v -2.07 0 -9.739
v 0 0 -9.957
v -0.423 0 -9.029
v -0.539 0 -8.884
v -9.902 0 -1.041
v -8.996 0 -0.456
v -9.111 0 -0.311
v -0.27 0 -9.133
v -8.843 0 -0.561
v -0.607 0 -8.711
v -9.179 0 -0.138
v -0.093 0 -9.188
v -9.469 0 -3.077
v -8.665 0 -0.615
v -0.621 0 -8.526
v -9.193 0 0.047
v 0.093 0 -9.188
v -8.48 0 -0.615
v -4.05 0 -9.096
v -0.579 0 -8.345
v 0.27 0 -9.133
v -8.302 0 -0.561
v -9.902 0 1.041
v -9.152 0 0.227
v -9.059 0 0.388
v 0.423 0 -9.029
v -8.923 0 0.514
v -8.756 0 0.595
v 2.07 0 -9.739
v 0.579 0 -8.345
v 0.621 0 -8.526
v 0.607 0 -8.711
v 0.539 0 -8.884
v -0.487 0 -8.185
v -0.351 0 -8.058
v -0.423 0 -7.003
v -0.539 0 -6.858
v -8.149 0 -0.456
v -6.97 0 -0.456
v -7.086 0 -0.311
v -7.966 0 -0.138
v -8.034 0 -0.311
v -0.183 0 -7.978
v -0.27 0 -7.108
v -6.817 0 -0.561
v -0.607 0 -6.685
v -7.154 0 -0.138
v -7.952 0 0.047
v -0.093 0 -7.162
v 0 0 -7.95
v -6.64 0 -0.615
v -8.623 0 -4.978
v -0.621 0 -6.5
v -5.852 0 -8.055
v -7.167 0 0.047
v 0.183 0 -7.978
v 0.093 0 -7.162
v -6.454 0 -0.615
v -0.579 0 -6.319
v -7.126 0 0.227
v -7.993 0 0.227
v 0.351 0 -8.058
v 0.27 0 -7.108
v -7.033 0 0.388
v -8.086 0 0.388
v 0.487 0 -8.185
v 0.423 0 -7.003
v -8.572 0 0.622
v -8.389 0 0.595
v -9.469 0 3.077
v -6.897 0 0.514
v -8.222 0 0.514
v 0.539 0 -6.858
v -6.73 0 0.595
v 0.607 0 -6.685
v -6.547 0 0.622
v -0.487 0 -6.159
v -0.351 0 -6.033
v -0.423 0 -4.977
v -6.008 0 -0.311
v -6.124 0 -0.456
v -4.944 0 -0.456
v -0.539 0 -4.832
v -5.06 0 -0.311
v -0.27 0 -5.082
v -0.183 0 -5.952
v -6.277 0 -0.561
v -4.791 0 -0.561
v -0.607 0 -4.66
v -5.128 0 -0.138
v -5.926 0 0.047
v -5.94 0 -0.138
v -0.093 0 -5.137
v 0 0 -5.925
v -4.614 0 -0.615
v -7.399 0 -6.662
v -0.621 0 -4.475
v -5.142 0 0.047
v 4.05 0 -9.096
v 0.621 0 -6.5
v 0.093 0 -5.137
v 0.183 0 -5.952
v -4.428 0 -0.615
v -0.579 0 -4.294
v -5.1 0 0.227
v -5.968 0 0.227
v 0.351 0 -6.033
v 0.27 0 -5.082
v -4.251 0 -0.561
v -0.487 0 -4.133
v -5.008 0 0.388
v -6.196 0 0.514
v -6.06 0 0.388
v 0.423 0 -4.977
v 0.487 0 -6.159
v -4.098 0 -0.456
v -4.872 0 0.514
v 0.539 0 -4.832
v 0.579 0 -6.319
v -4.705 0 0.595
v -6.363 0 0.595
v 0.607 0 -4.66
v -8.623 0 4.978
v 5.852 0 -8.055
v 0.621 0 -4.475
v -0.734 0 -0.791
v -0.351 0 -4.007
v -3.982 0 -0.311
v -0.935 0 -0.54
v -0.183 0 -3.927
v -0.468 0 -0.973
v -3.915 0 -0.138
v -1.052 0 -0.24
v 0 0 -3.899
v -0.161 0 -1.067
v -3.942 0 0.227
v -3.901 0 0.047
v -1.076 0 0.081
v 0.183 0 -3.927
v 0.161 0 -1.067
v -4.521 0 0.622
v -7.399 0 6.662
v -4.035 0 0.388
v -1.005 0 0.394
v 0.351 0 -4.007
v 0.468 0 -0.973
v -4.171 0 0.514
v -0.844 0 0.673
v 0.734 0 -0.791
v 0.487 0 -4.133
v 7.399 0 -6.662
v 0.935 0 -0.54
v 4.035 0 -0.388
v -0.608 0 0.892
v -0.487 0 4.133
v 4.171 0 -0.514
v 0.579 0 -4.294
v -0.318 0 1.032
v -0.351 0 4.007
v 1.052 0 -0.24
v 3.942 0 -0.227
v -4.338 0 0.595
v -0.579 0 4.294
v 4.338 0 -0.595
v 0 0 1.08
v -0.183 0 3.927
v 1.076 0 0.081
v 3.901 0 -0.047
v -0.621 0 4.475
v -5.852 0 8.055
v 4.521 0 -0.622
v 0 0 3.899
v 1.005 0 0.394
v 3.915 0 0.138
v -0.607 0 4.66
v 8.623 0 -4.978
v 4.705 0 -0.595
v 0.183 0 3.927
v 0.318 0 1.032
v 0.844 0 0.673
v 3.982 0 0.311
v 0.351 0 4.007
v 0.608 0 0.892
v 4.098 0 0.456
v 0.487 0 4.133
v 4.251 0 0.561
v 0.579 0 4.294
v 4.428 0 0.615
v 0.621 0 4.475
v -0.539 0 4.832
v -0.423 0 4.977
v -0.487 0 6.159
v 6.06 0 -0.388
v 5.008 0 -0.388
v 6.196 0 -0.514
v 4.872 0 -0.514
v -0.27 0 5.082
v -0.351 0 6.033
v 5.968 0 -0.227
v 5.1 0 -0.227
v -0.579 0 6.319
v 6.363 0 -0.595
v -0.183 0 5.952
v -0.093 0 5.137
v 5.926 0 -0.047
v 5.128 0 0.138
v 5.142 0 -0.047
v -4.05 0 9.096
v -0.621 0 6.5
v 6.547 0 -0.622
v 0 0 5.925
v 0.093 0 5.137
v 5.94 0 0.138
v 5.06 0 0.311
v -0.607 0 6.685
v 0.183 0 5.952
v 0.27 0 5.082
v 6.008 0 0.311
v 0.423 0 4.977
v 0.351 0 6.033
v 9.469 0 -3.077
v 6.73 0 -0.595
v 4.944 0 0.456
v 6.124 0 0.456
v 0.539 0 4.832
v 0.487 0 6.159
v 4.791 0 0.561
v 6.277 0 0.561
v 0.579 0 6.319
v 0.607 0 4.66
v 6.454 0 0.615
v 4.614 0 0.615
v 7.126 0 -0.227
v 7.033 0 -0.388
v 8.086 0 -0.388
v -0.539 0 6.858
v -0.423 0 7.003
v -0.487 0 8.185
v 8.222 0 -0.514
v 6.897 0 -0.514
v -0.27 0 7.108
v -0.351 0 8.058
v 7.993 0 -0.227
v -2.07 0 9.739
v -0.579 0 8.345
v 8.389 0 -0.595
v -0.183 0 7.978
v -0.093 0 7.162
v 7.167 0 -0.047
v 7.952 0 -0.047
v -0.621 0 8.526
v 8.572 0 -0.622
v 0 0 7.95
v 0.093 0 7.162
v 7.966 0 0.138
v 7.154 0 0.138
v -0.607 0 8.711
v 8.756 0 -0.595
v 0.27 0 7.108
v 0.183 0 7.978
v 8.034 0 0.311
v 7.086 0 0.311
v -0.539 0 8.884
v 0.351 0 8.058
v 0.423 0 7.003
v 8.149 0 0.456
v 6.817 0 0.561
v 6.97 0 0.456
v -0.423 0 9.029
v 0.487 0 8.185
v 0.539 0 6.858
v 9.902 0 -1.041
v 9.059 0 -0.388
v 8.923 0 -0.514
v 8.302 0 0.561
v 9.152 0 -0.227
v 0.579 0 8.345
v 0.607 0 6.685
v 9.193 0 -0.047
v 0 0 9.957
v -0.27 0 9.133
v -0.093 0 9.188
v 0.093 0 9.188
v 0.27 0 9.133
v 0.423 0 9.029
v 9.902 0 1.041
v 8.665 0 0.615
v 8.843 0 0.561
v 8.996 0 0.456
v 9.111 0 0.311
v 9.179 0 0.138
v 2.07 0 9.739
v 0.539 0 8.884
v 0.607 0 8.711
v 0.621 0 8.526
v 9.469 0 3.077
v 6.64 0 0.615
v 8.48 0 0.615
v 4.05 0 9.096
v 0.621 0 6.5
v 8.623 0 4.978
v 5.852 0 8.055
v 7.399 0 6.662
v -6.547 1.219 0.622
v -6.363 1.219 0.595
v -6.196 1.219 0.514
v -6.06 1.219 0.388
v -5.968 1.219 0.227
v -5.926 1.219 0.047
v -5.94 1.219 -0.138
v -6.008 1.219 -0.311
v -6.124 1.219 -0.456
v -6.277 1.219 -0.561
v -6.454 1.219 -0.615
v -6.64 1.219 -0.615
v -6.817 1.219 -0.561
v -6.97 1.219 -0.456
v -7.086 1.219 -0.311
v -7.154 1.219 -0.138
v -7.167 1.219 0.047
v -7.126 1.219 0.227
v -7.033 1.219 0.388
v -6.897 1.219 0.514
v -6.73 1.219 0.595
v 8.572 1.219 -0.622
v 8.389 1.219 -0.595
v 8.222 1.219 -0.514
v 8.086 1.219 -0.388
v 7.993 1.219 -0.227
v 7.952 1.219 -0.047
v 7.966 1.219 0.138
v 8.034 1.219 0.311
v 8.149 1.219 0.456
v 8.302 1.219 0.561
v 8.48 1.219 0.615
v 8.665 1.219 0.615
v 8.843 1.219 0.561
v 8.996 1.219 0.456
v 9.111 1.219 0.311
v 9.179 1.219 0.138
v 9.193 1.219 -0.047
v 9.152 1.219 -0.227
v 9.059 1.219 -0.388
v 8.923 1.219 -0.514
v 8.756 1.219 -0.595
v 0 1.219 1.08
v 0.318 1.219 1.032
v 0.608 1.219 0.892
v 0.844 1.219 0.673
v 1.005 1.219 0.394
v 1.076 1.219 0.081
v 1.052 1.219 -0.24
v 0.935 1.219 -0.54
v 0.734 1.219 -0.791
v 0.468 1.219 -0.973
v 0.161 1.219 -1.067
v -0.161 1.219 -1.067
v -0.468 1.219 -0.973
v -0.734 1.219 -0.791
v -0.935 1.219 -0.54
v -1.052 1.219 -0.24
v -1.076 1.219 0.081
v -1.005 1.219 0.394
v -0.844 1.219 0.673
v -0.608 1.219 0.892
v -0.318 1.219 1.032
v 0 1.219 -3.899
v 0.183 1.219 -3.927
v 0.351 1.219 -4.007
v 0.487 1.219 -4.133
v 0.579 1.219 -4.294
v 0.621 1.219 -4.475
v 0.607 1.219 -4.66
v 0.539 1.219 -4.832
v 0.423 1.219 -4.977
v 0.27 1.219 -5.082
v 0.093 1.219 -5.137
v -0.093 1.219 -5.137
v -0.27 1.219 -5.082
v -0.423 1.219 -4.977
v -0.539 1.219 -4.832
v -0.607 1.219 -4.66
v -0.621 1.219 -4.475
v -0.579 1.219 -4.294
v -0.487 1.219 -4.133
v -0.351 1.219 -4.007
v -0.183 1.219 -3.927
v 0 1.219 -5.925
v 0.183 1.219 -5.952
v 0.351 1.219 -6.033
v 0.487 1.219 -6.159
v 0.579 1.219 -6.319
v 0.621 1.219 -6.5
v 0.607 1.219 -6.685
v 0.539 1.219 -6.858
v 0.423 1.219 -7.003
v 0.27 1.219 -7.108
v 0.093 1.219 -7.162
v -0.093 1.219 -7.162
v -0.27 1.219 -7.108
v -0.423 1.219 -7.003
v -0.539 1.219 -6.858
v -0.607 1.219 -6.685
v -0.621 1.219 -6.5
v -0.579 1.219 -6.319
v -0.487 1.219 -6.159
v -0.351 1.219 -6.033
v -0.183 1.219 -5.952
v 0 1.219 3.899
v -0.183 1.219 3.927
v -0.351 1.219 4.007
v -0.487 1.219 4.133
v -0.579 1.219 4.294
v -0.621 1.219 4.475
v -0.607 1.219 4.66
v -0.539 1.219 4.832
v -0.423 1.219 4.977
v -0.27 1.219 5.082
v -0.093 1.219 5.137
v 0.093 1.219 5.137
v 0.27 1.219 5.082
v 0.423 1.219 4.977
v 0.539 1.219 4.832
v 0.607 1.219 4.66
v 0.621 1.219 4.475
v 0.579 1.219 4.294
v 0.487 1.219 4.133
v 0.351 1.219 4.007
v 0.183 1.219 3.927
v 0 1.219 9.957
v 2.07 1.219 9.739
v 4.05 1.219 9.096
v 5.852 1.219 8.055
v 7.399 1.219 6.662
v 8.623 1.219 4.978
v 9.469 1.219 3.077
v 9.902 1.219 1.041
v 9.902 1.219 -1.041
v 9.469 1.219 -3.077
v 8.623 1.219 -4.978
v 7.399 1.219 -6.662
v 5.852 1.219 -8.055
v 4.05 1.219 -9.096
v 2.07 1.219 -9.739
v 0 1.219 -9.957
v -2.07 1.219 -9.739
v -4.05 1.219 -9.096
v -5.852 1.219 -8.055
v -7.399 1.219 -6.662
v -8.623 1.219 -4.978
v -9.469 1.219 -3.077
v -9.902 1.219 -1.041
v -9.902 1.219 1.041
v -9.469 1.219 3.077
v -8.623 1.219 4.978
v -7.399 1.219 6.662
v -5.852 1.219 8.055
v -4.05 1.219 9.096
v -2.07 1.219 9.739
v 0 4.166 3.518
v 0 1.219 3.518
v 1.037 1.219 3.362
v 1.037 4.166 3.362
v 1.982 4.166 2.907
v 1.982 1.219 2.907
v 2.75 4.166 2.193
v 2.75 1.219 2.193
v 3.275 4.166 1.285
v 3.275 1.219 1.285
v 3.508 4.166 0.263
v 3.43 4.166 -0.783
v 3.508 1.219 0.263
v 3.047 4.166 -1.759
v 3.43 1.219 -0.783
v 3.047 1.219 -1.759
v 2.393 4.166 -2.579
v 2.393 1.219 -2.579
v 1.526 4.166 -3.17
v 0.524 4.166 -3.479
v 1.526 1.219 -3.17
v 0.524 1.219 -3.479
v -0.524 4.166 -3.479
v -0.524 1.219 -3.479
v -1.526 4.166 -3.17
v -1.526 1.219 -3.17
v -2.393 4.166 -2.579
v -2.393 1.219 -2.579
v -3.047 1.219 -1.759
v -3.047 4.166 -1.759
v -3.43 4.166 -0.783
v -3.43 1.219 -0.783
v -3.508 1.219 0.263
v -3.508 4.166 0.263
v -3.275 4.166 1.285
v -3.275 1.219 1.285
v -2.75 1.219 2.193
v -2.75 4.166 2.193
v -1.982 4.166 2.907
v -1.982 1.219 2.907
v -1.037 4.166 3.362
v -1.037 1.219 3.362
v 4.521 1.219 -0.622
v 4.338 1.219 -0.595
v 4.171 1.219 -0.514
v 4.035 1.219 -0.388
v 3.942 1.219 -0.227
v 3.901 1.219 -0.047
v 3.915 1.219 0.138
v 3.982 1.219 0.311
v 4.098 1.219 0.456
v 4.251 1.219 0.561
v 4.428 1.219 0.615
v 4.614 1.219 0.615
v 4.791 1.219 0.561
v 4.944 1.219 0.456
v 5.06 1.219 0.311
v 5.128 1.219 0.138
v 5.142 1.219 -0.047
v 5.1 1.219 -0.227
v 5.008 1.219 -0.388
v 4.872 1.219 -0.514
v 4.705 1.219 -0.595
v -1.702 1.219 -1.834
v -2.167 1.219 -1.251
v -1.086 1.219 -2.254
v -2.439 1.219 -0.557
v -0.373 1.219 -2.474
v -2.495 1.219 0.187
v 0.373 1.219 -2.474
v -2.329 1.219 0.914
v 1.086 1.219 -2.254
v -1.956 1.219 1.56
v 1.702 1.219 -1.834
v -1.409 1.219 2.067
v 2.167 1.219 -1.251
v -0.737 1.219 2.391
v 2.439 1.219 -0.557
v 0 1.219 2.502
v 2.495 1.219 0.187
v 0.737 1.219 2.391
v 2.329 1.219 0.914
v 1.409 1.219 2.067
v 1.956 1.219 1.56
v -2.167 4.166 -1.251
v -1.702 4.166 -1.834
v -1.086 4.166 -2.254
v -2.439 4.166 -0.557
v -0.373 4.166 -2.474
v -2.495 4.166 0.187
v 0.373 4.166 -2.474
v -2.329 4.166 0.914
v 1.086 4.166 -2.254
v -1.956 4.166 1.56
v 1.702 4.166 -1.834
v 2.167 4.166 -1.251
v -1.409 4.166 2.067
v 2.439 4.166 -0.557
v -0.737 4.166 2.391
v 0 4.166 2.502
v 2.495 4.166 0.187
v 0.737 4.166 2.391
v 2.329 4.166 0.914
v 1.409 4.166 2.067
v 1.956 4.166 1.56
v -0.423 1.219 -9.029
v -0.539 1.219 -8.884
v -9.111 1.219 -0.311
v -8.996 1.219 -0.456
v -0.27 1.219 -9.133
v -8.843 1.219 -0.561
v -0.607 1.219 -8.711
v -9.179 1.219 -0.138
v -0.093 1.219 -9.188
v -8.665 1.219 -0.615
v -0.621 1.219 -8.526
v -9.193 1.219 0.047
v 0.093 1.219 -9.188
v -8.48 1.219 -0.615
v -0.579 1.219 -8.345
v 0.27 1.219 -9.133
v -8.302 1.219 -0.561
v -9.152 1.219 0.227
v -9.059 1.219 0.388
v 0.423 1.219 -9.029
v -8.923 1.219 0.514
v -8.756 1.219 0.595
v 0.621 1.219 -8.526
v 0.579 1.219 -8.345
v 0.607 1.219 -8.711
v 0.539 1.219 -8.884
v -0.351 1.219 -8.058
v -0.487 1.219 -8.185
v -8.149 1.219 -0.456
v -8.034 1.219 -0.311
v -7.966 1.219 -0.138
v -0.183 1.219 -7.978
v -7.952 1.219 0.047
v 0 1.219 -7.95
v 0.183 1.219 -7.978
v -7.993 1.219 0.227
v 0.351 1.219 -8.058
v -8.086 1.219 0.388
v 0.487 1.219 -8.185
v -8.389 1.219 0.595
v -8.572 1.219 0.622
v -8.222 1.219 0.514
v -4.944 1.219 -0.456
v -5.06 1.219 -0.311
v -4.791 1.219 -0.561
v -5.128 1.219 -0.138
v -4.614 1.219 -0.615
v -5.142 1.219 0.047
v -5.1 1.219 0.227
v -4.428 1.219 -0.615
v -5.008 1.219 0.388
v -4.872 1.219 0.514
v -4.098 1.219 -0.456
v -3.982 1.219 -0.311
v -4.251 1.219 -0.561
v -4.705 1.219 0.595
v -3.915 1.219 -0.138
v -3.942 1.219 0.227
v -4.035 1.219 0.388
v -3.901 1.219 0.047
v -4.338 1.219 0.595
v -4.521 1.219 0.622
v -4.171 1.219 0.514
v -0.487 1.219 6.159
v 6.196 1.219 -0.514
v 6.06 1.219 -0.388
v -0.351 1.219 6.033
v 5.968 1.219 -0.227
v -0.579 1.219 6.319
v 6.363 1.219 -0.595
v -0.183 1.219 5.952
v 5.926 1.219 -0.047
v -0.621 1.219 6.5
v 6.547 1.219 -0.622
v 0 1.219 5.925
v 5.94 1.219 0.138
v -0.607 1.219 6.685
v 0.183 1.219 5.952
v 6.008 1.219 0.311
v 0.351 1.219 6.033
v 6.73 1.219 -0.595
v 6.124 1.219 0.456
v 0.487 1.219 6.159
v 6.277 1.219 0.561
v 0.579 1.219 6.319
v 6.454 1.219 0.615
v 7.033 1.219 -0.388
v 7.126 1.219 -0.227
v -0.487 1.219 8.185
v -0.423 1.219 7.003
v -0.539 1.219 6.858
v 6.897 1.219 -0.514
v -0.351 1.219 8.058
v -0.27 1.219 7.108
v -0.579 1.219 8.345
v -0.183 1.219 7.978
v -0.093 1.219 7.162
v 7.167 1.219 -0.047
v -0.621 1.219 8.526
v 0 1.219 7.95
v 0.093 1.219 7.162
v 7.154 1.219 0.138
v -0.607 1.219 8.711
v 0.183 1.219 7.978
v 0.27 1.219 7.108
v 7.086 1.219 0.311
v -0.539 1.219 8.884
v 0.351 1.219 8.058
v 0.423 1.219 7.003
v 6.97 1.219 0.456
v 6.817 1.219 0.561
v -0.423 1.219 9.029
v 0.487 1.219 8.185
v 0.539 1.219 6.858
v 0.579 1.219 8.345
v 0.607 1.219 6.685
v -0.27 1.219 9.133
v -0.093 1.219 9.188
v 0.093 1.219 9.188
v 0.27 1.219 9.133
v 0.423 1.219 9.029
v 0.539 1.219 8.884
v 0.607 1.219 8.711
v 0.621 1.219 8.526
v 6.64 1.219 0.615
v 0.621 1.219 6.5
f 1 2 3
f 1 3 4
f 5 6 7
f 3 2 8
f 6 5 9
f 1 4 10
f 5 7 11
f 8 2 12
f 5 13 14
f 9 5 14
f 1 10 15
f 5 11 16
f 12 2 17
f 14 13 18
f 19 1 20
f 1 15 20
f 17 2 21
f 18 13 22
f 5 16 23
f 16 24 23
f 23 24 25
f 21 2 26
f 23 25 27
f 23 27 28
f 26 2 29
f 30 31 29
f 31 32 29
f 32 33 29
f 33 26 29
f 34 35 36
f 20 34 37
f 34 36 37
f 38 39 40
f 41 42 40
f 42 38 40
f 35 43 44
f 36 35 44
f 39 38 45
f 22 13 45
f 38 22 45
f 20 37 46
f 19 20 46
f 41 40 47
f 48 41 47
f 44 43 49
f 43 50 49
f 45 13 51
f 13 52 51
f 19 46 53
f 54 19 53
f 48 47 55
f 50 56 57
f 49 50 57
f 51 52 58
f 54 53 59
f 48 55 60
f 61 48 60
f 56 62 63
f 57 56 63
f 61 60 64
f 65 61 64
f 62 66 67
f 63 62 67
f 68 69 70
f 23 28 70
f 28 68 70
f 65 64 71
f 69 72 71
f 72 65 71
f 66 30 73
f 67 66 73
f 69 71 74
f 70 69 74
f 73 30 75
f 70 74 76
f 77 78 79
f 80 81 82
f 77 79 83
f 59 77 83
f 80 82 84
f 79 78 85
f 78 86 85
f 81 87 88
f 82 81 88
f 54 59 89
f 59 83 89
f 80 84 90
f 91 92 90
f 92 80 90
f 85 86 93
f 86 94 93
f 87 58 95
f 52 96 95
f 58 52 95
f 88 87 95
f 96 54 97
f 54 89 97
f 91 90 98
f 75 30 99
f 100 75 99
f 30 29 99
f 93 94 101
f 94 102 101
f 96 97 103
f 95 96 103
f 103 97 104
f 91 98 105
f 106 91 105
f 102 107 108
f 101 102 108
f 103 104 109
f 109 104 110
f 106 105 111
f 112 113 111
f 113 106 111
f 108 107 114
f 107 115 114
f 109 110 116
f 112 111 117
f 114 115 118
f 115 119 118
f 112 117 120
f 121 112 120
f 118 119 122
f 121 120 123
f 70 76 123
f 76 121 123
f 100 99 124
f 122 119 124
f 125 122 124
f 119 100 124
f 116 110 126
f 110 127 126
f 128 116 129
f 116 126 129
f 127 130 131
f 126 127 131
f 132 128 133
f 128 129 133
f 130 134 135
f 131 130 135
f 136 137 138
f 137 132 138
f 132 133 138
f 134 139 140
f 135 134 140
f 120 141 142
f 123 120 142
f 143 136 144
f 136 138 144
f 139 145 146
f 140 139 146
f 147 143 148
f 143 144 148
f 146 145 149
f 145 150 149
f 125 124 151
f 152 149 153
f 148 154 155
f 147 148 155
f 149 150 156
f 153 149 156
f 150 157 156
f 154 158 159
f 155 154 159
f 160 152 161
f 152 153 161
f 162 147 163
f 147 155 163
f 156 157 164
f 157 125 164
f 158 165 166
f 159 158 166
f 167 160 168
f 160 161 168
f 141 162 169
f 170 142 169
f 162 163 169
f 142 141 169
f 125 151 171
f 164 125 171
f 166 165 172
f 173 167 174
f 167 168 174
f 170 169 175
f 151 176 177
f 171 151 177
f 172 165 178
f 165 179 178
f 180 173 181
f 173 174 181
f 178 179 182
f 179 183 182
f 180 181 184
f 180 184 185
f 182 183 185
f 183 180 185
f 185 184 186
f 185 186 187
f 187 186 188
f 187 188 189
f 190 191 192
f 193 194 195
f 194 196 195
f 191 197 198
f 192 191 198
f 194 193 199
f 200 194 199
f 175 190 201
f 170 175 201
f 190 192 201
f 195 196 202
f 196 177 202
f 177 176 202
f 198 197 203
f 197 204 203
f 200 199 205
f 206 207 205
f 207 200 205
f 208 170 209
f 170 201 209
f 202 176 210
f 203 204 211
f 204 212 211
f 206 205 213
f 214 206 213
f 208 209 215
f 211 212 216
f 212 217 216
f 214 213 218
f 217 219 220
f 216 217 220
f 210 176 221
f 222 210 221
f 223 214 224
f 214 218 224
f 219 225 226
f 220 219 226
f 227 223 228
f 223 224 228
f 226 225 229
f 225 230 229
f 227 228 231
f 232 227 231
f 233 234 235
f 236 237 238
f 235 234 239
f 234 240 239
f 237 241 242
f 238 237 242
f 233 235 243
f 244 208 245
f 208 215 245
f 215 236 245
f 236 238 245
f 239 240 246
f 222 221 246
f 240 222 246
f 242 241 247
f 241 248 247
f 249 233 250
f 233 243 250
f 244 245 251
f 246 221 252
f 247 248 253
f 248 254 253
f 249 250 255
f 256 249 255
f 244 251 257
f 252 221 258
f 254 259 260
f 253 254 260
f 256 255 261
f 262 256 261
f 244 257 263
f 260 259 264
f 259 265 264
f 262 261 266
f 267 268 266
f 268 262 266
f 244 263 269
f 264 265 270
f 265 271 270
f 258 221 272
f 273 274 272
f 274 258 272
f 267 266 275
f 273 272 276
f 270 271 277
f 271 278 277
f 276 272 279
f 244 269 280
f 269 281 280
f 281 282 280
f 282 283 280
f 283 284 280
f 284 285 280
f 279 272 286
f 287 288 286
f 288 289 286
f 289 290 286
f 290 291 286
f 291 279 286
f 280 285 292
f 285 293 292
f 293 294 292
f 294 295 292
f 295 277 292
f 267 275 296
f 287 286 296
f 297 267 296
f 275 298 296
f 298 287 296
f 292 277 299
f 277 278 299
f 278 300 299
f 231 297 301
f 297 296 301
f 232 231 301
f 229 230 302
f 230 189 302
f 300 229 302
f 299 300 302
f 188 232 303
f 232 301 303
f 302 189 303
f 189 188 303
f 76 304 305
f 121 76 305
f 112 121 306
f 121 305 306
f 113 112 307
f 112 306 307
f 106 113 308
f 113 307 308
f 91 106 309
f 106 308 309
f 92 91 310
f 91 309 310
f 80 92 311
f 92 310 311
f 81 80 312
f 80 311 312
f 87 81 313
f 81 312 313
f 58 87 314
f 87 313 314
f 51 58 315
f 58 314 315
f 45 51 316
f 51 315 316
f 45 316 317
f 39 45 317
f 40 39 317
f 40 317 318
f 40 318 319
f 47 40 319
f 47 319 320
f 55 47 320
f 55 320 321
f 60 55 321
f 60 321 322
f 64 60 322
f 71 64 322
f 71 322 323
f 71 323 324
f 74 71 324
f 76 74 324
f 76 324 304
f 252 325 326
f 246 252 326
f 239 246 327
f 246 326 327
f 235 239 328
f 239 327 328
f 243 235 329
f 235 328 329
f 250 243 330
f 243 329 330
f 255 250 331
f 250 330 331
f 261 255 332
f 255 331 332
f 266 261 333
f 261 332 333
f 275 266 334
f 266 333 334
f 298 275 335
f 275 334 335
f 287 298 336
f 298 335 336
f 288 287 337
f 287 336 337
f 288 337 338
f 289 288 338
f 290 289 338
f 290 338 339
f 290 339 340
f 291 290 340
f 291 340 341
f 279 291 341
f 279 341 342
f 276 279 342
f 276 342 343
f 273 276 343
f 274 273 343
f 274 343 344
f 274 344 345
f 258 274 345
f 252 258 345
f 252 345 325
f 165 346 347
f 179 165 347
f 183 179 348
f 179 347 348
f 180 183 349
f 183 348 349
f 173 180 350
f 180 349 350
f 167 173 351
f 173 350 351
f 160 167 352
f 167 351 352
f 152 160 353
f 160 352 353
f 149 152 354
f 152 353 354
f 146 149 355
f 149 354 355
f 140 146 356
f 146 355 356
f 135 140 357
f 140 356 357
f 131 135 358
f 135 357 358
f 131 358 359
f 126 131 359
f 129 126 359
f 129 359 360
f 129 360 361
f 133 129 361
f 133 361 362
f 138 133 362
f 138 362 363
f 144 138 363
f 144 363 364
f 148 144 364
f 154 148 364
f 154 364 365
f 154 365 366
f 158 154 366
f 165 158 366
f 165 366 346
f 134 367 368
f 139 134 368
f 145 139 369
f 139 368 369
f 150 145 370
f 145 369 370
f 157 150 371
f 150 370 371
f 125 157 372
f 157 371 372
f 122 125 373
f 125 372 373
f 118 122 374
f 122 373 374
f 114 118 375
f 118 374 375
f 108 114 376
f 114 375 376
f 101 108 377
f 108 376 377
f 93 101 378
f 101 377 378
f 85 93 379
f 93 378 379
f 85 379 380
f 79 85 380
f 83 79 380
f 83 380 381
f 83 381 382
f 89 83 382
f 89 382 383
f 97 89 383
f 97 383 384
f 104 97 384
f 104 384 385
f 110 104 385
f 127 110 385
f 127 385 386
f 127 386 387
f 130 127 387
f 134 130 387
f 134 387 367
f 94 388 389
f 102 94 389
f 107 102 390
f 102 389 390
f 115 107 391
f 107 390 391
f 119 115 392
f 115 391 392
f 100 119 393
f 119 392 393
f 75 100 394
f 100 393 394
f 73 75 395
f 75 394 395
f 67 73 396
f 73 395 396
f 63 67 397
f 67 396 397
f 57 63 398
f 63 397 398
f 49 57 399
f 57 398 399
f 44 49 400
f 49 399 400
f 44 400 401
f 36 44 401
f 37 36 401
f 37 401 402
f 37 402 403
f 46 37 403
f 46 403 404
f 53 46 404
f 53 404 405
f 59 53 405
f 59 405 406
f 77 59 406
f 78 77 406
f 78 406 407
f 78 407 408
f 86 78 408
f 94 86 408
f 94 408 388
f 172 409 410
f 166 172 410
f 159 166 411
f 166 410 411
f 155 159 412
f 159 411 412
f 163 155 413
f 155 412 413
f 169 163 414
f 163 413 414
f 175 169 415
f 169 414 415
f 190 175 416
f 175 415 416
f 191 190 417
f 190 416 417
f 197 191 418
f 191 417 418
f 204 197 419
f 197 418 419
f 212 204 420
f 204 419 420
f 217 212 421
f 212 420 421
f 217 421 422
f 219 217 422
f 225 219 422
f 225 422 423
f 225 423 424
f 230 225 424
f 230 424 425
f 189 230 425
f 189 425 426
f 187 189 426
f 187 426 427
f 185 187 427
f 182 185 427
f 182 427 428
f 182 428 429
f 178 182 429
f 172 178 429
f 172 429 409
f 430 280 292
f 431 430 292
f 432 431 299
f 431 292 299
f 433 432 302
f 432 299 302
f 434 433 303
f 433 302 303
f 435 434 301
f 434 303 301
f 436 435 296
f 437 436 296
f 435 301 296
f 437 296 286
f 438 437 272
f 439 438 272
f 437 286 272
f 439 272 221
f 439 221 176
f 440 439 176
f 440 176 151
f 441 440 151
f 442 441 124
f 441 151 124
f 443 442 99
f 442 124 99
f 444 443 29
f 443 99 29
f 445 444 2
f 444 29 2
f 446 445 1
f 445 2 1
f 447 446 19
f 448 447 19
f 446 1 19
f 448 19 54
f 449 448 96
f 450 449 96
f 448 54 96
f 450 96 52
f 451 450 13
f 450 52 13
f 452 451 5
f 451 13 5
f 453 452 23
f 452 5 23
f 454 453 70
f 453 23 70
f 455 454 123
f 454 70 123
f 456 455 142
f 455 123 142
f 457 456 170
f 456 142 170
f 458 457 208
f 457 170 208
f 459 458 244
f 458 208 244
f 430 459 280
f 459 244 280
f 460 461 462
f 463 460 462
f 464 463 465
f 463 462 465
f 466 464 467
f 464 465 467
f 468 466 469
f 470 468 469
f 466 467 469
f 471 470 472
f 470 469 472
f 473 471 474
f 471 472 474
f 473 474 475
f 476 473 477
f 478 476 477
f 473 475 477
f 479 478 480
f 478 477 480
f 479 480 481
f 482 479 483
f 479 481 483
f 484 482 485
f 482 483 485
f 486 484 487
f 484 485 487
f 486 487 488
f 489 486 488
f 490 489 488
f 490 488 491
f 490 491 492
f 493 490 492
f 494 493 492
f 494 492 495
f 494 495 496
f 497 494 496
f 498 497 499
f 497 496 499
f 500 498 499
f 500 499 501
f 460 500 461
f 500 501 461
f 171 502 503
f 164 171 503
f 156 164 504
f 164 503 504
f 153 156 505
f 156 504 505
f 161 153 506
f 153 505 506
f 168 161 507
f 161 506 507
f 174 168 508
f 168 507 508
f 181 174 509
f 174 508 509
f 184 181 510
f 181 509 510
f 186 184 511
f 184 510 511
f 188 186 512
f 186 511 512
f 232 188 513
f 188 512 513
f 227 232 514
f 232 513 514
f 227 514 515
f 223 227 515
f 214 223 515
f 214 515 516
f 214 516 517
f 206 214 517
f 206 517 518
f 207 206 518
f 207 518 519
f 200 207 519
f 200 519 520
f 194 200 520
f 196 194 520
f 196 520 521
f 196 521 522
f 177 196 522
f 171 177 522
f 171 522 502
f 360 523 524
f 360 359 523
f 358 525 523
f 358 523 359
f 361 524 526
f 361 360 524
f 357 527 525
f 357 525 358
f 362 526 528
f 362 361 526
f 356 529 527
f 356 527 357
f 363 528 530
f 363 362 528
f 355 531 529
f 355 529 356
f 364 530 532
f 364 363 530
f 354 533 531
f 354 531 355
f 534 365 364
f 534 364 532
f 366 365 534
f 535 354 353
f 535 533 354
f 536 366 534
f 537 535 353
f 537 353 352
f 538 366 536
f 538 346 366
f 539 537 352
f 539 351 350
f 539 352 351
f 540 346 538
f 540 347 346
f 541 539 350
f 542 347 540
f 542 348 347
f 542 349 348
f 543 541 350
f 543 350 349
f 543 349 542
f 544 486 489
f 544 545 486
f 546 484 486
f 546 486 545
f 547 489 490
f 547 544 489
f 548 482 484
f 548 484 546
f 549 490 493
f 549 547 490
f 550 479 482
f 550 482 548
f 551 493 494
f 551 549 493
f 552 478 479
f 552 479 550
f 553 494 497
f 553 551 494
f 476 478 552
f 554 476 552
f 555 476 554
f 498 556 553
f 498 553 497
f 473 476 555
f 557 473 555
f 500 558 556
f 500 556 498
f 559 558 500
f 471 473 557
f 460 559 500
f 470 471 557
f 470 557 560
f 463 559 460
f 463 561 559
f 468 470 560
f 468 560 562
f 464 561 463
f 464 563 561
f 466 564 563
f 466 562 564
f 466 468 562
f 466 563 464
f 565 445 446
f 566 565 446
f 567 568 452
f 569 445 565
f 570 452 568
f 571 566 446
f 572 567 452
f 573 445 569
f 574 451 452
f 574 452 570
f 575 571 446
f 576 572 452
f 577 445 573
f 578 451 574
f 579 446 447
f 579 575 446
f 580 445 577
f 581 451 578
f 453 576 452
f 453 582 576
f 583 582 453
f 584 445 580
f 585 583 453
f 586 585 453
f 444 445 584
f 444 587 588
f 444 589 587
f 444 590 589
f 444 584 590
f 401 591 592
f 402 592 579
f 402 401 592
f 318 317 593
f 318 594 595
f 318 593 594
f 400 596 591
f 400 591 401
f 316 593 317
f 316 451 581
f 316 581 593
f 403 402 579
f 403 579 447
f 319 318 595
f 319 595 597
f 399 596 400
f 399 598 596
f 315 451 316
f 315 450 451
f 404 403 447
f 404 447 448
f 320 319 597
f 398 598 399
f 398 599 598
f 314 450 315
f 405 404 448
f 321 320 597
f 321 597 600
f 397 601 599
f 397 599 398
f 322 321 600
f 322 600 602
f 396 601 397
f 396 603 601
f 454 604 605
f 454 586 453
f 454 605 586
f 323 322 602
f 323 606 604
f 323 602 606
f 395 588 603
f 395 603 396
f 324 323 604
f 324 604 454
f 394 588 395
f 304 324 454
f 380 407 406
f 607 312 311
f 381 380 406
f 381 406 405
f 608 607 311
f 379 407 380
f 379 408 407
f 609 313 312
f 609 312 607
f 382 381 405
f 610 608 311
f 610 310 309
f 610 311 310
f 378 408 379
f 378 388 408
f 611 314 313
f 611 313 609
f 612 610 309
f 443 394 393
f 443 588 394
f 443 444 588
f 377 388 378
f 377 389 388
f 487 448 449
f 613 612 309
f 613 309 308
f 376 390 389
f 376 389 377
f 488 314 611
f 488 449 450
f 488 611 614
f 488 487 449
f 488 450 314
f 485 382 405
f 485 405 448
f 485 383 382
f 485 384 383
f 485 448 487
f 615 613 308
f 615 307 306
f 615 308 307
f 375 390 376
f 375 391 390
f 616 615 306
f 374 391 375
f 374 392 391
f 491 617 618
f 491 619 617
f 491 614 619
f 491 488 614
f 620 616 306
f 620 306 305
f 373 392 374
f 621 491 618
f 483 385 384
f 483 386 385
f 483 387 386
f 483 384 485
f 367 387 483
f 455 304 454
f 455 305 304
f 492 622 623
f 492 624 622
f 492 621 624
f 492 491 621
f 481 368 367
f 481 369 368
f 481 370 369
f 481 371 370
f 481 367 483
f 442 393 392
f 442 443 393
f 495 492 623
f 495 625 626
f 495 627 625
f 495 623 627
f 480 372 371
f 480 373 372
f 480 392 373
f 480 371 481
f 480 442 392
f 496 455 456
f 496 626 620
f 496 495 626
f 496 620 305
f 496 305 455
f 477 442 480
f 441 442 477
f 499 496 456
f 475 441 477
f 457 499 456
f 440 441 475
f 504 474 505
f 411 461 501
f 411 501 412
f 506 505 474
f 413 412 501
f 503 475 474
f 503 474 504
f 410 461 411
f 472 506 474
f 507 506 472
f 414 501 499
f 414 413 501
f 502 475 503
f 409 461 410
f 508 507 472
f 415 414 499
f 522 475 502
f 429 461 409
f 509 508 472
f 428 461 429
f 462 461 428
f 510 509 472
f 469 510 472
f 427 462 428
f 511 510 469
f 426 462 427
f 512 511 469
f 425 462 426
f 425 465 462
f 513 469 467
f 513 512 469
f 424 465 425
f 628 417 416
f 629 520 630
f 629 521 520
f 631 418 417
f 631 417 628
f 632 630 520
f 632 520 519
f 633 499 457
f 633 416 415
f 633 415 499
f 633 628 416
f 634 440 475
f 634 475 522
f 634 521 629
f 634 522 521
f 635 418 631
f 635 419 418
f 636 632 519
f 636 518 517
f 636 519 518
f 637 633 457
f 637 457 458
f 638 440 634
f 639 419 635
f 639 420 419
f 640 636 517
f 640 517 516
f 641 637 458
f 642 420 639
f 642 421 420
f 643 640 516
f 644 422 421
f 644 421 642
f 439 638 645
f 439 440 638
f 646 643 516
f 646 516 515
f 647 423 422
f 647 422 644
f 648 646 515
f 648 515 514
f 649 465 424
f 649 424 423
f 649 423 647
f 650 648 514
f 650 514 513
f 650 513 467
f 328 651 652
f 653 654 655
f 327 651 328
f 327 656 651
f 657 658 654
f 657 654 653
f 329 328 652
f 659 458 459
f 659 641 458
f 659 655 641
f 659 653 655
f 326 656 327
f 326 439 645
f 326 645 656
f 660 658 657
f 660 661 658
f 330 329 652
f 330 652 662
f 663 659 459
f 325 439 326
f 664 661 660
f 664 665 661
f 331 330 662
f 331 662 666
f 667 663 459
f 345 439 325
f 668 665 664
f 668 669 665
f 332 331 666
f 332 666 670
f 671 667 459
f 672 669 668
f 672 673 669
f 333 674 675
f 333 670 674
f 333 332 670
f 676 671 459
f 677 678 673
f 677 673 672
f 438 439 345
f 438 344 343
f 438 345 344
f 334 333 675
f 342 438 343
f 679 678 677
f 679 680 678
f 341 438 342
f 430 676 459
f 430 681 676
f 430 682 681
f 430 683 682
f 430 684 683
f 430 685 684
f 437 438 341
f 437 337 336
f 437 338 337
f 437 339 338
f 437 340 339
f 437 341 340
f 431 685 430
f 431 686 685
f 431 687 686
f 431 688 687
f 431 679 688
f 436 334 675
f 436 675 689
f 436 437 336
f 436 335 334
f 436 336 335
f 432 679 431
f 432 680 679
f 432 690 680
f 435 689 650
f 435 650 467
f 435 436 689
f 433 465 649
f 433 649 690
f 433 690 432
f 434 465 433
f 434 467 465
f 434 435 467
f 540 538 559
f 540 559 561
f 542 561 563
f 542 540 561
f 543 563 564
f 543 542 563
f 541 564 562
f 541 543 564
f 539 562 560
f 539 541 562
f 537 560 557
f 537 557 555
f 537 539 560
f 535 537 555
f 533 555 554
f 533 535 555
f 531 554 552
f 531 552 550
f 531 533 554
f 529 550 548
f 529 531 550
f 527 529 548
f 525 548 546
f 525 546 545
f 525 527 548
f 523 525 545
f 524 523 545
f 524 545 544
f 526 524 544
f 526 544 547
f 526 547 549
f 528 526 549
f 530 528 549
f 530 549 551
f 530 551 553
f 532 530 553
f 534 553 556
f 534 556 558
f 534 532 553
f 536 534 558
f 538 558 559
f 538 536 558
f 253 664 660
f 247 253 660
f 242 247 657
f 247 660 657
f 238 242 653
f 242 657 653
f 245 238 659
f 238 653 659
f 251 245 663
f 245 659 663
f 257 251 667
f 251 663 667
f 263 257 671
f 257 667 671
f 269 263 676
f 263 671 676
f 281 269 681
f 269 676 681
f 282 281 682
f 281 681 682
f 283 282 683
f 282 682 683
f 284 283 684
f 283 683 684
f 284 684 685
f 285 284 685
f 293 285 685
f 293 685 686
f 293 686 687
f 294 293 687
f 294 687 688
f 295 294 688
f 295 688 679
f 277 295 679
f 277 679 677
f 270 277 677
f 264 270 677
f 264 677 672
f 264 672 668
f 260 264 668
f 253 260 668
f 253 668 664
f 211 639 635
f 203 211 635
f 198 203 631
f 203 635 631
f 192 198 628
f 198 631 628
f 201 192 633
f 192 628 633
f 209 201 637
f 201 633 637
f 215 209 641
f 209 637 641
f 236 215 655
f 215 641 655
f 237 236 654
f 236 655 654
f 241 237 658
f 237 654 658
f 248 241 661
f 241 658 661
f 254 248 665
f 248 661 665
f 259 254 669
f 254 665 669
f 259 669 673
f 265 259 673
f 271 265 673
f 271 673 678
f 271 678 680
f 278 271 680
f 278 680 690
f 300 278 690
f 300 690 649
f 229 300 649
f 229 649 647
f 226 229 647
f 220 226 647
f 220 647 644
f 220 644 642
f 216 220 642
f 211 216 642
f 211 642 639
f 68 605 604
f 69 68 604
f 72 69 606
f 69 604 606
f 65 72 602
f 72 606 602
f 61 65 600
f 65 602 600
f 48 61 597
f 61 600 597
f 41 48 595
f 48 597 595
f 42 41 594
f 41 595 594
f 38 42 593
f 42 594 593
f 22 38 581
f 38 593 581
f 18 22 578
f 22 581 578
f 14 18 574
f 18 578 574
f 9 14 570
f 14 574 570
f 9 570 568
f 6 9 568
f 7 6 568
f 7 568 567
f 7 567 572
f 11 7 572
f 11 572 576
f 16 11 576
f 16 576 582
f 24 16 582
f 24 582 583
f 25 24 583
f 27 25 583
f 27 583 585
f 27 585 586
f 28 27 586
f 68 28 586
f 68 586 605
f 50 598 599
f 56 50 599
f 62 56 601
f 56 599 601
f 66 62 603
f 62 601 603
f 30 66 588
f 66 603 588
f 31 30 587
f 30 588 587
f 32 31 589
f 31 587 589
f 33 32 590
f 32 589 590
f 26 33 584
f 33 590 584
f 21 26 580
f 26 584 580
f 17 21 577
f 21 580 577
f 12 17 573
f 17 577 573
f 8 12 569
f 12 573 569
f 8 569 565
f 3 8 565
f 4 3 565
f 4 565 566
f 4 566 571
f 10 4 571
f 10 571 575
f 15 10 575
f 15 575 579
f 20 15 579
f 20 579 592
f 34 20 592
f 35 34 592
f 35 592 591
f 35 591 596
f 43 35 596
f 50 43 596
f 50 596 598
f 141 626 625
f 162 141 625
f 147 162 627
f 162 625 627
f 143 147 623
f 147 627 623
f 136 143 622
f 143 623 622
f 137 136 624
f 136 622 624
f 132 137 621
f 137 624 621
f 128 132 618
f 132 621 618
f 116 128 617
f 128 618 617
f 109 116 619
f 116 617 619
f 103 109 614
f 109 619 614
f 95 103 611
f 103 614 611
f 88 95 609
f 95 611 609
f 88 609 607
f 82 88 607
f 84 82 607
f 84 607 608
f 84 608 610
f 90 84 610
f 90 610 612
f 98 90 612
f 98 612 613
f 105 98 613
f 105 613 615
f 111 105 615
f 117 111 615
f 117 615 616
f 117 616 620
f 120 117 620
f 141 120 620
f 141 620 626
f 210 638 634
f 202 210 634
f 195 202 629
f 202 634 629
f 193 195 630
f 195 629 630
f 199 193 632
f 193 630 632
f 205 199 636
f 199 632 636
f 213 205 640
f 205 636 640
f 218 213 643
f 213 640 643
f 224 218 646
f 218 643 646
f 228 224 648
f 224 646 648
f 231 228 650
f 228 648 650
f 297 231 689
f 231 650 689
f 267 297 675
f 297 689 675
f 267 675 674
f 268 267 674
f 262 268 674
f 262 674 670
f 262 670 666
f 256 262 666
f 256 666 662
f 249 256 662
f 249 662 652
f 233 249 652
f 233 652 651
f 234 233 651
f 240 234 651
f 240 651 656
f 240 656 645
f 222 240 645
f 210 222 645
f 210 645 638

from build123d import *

# Parameters (mm, degrees)
SKETCH1_R           = 9.9568
BOSS_EXTRUDE1_DEPTH = 1.2192
SKETCH2_R           = 3.5179
SKETCH2_R_2         = 2.5019
BOSS_EXTRUDE2_DEPTH = 2.9464
SKETCH3_R           = 1.0795
SKETCH3_R_2         = 0.6223
CUT_EXTRUDE1_DEPTH  = 15.386000328


with BuildPart() as part:
    # Sketch1 → Boss-Extrude1 (new body)
    with BuildSketch(Plane(origin=(0, 0, 0), x_dir=(1, 0, 0), z_dir=(0, 1, 0))):
        with Locations(Location((0, 0, 0), (0, 0, 270))):
            Circle(SKETCH1_R)
    extrude(amount=BOSS_EXTRUDE1_DEPTH)

    # Sketch2 → Boss-Extrude2 (add)
    with BuildSketch(Plane(origin=(0, 1.2192, 0), x_dir=(1, 0, 0), z_dir=(0, 1, 0))):
        with Locations(Location((0, 0, 0), (0, 0, 270))):
            Circle(SKETCH2_R)
        with Locations(Location((0, 0, 0), (0, 0, 270))):
            Circle(SKETCH2_R_2, mode=Mode.SUBTRACT)
    extrude(amount=BOSS_EXTRUDE2_DEPTH)

    # Sketch3 → Cut-Extrude1 (cut, through all)
    with BuildSketch(Plane(origin=(0, 1.2192, 0), x_dir=(1, 0, 0), z_dir=(0, 1, 0))):
        with Locations(Location((0, 0, 0), (0, 0, 270))):
            Circle(SKETCH3_R)
        with Locations(Location((-4.5212, 0, 0), (0, 0, 270))):
            Circle(SKETCH3_R_2)
        with Locations(Location((-6.54685, 0, 0), (0, 0, 270))):
            Circle(SKETCH3_R_2)
        with Locations(Location((-8.5725, 0, 0), (0, 0, 270))):
            Circle(SKETCH3_R_2)
        with Locations(Location((8.5725, 0, 0), (0, 0, 90))):
            Circle(SKETCH3_R_2)
        with Locations(Location((6.54685, 0, 0), (0, 0, 90))):
            Circle(SKETCH3_R_2)
        with Locations(Location((4.5212, 0, 0), (0, 0, 90))):
            Circle(SKETCH3_R_2)
        with Locations(Location((0, 4.5212, 0), (0, 0, 270))):
            Circle(SKETCH3_R_2)
        with Locations(Location((0, 6.54685, 0), (0, 0, 270))):
            Circle(SKETCH3_R_2)
        with Locations(Location((0, 8.5725, 0), (0, 0, 270))):
            Circle(SKETCH3_R_2)
        with Locations(Location((0, -4.5212, 0), (0, 0, 90))):
            Circle(SKETCH3_R_2)
        with Locations(Location((0, -6.54685, 0), (0, 0, 90))):
            Circle(SKETCH3_R_2)
        with Locations(Location((0, -8.5725, 0), (0, 0, 90))):
            Circle(SKETCH3_R_2)
    extrude(amount=-CUT_EXTRUDE1_DEPTH, mode=Mode.SUBTRACT)


solid = part.part
